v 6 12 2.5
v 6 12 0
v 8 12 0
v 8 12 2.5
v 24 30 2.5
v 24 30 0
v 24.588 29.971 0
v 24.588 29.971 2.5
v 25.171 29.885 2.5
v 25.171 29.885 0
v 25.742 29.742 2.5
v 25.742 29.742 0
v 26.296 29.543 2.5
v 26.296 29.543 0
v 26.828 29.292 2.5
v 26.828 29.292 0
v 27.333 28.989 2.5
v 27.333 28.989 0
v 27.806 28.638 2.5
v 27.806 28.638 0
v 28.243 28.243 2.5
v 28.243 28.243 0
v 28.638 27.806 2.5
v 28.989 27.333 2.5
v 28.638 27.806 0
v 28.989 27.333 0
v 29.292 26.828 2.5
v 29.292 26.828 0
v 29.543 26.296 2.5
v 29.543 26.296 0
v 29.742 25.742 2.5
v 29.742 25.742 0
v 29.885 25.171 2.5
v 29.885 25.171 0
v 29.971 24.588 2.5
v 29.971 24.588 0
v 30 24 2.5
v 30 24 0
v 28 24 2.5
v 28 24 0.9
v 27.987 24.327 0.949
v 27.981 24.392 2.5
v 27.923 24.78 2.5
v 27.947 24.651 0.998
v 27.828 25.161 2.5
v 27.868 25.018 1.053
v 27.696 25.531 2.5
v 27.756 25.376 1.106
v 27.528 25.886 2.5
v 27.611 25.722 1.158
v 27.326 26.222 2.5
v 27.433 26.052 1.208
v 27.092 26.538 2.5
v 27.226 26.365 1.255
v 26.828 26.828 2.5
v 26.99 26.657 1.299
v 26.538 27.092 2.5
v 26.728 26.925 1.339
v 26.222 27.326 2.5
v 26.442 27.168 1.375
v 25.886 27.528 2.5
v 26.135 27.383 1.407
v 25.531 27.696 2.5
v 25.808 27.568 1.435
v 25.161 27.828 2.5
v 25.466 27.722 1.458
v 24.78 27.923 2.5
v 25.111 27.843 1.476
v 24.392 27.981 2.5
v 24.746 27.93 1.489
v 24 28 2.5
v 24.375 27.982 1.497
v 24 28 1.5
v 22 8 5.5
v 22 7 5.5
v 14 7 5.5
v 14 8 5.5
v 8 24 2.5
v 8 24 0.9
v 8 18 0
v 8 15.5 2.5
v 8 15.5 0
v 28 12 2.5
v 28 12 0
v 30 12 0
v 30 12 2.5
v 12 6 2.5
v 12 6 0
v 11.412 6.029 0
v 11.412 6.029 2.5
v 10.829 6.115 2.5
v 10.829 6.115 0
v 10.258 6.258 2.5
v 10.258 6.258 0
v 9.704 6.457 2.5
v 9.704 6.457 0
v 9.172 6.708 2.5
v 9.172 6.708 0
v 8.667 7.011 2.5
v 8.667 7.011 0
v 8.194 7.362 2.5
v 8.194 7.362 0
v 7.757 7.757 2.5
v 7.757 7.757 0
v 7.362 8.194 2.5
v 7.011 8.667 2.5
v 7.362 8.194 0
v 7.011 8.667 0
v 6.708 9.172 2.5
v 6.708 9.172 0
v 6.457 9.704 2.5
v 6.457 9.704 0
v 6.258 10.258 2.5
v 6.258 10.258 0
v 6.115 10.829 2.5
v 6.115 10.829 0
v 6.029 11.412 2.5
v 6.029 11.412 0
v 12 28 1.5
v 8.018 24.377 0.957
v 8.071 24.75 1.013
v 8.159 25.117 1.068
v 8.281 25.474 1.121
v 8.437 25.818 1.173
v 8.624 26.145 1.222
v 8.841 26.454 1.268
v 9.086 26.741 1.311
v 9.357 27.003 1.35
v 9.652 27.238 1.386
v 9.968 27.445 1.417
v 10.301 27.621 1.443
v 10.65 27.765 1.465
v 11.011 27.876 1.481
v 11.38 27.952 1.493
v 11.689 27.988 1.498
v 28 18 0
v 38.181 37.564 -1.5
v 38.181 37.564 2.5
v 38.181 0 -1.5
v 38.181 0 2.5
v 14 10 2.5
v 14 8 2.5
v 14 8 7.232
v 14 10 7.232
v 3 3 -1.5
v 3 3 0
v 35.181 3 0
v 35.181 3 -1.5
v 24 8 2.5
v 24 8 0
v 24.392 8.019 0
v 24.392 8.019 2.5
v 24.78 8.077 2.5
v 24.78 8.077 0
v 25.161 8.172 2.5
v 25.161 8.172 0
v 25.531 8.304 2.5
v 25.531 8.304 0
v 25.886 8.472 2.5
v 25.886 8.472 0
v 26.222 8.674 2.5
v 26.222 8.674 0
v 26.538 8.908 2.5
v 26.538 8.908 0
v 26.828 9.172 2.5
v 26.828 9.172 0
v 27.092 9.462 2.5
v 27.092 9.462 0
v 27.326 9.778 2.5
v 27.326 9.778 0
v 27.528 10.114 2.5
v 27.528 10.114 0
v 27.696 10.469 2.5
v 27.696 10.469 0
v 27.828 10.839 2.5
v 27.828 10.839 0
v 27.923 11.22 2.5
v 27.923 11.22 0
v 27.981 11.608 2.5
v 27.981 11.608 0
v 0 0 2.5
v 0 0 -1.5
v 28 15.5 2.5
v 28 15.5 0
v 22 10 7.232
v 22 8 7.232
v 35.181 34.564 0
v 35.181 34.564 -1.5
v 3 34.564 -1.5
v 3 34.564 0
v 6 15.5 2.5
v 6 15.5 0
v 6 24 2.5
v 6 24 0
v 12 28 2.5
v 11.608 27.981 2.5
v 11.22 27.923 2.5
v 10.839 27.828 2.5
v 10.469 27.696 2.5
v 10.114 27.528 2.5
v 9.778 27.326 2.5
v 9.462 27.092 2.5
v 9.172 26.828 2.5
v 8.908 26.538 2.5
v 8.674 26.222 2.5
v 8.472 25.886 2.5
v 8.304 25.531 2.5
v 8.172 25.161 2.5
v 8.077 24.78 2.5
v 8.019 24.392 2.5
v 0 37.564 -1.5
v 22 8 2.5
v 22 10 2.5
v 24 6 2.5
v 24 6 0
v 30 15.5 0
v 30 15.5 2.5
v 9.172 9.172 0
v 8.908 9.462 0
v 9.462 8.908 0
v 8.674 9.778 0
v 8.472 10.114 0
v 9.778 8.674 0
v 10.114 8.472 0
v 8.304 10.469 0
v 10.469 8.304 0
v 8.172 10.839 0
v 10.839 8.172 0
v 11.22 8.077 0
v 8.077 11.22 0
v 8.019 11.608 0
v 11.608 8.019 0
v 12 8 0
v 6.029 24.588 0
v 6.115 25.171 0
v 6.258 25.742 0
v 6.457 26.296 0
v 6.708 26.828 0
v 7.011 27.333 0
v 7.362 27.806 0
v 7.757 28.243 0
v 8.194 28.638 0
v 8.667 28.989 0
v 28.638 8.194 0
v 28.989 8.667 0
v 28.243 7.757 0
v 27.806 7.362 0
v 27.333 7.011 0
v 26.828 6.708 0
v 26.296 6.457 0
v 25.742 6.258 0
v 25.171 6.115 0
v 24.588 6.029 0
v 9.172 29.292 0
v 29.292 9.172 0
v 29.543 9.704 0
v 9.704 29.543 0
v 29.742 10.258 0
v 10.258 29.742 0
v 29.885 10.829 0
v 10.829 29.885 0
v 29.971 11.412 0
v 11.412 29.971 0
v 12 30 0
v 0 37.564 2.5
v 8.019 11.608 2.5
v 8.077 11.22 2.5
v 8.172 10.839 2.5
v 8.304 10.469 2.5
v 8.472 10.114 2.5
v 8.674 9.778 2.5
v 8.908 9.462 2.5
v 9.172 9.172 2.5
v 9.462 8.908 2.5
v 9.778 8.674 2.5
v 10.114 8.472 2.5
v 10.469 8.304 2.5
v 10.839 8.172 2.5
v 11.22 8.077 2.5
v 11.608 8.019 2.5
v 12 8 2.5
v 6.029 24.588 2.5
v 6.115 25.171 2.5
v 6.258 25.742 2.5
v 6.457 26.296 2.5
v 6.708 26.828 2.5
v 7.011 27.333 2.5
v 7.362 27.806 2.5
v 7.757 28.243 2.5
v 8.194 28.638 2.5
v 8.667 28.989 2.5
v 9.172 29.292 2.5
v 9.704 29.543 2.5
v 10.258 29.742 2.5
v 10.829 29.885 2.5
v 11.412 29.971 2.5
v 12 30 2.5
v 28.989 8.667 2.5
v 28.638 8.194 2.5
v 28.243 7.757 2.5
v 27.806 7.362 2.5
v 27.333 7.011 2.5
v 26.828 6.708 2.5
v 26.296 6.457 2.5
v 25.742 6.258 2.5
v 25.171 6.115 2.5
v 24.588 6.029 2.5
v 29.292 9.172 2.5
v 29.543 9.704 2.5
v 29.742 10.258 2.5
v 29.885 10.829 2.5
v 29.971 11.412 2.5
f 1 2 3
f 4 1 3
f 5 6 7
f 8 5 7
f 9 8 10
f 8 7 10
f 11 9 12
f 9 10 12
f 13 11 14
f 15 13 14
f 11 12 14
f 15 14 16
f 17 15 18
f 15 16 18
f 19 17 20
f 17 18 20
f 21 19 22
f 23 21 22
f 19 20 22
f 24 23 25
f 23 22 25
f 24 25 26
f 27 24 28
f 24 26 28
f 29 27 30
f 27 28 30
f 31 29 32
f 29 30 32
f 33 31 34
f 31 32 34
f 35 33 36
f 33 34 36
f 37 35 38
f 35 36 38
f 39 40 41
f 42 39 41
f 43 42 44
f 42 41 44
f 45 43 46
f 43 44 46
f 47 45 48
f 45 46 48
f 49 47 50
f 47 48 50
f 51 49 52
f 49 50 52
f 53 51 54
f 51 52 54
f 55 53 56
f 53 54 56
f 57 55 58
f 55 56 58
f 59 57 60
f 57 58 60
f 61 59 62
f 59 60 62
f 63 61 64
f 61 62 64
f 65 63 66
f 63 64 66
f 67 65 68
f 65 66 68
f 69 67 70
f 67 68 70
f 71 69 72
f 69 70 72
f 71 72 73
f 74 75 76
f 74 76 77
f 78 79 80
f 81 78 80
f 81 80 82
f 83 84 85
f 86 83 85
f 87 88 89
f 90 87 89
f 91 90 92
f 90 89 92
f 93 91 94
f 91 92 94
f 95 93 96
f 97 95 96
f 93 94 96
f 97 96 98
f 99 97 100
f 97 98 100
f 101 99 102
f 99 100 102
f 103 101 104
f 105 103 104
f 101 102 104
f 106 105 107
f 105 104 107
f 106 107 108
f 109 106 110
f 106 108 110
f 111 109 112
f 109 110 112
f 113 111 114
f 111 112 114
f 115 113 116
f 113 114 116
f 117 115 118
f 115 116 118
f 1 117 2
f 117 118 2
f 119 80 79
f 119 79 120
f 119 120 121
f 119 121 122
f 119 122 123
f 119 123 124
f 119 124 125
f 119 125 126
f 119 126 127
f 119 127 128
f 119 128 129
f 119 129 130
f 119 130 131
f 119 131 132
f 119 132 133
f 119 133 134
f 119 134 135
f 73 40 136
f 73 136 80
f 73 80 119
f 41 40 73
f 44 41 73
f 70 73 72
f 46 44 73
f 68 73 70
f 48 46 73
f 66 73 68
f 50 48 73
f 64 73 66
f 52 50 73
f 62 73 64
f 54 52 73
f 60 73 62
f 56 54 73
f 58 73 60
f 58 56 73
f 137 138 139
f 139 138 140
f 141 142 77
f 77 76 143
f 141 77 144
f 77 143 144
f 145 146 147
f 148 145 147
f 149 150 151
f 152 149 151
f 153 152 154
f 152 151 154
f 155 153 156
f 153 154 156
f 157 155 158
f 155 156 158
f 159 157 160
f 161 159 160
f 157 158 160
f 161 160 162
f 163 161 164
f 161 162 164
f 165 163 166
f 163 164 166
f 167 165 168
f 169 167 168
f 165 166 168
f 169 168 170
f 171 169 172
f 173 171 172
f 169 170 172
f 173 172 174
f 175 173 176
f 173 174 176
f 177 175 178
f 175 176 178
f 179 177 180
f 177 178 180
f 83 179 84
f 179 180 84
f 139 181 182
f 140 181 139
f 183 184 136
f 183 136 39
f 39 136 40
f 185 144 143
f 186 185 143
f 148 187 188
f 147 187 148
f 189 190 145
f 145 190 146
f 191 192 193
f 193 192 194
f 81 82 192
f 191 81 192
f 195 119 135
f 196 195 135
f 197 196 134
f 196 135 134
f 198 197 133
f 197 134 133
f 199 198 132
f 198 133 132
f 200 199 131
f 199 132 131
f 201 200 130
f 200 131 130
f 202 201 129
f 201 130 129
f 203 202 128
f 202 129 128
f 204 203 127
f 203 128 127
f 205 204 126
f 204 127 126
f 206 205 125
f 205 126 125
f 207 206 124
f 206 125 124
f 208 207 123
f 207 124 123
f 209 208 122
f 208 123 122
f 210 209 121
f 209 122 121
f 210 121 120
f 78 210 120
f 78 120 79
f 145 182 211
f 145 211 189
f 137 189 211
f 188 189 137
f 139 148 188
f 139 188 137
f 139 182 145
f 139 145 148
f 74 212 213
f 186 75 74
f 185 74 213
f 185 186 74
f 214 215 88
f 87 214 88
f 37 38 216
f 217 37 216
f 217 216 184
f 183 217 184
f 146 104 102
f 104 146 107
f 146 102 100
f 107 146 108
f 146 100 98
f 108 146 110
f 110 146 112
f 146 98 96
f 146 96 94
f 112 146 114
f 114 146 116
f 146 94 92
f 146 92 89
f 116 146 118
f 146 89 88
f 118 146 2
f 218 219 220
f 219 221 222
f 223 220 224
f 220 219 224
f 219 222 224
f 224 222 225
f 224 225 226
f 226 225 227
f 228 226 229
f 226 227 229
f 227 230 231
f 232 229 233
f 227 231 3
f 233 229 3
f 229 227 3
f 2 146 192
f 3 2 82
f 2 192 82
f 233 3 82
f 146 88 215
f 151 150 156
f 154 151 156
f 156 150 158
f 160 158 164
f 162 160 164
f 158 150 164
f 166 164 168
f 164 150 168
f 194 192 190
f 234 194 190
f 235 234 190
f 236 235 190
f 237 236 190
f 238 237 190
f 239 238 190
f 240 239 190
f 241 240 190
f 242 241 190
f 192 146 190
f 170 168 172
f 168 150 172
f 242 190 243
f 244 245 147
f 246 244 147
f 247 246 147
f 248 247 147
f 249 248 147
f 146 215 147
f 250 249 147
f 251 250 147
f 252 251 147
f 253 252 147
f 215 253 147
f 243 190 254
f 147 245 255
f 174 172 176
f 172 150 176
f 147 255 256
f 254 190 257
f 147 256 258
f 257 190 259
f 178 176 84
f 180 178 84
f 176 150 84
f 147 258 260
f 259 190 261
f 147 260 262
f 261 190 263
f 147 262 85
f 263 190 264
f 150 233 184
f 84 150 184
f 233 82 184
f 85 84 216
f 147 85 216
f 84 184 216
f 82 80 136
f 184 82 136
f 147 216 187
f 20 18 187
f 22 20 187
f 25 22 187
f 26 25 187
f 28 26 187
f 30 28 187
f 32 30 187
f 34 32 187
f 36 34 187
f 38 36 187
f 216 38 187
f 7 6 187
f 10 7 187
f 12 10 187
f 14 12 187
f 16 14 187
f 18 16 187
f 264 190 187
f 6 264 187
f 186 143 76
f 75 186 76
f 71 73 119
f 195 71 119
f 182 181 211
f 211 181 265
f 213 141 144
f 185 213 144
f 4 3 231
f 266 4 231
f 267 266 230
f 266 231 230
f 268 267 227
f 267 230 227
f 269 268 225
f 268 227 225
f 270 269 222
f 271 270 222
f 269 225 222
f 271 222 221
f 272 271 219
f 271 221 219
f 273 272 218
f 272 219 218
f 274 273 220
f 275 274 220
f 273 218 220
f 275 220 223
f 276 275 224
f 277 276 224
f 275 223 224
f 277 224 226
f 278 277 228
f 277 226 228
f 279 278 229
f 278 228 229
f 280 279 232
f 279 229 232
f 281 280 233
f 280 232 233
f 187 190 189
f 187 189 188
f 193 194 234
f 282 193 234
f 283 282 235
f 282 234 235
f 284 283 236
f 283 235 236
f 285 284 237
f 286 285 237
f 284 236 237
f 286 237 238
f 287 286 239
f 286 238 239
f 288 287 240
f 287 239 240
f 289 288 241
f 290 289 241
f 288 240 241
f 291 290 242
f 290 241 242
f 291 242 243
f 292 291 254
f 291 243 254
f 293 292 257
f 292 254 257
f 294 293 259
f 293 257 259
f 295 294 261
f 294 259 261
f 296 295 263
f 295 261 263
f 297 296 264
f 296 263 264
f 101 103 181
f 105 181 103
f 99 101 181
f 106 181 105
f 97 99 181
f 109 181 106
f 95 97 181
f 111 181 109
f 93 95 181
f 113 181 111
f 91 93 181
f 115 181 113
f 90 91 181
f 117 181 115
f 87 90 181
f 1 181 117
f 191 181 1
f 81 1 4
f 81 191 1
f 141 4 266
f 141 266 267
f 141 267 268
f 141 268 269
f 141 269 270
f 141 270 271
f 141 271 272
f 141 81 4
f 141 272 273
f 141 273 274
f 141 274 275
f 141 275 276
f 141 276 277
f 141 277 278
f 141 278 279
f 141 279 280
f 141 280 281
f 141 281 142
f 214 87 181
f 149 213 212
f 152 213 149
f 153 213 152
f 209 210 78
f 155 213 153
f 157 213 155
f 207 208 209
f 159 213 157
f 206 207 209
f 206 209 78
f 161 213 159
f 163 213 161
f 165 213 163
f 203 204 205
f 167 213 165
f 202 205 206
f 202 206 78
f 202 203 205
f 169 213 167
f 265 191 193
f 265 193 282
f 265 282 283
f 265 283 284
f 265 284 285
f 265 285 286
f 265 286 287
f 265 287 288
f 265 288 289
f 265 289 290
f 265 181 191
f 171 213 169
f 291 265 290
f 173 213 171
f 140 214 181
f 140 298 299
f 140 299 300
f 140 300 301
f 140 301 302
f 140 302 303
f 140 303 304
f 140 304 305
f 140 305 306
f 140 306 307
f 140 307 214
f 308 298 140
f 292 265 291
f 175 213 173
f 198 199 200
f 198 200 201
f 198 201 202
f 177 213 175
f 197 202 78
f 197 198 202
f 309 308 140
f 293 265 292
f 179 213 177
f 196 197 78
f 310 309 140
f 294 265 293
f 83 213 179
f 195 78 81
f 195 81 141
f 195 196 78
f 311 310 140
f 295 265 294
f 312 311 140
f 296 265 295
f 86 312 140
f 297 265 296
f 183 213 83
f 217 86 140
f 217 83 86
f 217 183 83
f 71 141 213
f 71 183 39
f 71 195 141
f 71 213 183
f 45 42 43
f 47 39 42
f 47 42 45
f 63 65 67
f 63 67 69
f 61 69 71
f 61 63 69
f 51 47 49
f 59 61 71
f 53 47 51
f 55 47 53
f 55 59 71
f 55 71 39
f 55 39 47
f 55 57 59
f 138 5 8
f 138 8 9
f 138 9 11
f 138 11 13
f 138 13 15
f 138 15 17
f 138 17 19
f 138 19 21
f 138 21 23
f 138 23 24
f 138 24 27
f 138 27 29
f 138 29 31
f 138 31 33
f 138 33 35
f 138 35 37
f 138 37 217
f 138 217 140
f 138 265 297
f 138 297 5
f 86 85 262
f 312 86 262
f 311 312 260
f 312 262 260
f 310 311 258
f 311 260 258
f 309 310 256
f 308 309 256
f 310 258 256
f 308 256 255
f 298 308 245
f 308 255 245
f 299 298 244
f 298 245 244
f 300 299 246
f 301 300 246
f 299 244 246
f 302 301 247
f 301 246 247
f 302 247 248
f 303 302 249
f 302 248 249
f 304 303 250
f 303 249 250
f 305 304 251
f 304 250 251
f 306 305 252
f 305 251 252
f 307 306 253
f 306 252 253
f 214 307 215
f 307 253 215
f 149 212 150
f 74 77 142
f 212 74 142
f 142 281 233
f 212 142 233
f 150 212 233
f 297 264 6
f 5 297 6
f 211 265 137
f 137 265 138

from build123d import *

# Parameters (mm, degrees)
F0_W        = 38.181103766
F0_H        = 37.5636257231
F1_DEPTH    = 2.5
F2_W        = 38.181103766
F2_H        = 37.5636257231
F2_W_2      = 32.181103766
F2_H_2      = 31.5636257231
F3_DEPTH    = 1.5
F5_DEPTH    = 22
F6_DEPTH    = 14
F7_T4_DEPTH = 63.9787194011


# Not quite as in the source:
# - a fillet or chamfer that OpenCascade refuses, or shapes differently, is made with other operations: its cross-section is extruded or revolved along the edge and cut away or added


with BuildPart() as f1:
    # F0 (on Top) → F1 (new body)
    with BuildSketch(Plane.XY):
        with Locations((19.090551883, 18.7818128616)):
            Rectangle(F0_W, F0_H)
        with BuildLine():
            ThreePointArc((8, 12), (9.1715728753, 9.1715728753), (12, 8))
            Line((12, 8), (24, 8))
            ThreePointArc((24, 8), (26.8284271247, 9.1715728753), (28, 12))
            Line((28, 12), (30, 12))
            ThreePointArc((30, 12), (28.2426406871, 7.7573593129), (24, 6))
            Line((24, 6), (12, 6))
            ThreePointArc((12, 6), (7.7573593129, 7.7573593129), (6, 12))
            Line((6, 12), (8, 12))
        make_face(mode=Mode.SUBTRACT)
        with BuildLine():
            Line((24, 28), (12, 28))
            ThreePointArc((12, 28), (9.1715728753, 26.8284271247), (8, 24))
            Line((8, 24), (8, 15.5))
            Line((8, 15.5), (6, 15.5))
            Line((6, 15.5), (6, 24))
            ThreePointArc((6, 24), (7.7573593129, 28.2426406871), (12, 30))
            Line((12, 30), (24, 30))
            ThreePointArc((24, 30), (28.2426406871, 28.2426406871), (30, 24))
            Line((30, 24), (30, 15.5))
            Line((30, 15.5), (28, 15.5))
            Line((28, 15.5), (28, 24))
            ThreePointArc((28, 24), (26.8284271247, 26.8284271247), (24, 28))
        make_face(mode=Mode.SUBTRACT)
    extrude(amount=F1_DEPTH)

    # F2 (on face) → F3 (join)
    with BuildSketch(Plane(origin=(0, 0, 0), x_dir=(1, 0, 0), z_dir=(0, 0, -1))):
        with Locations((19.090551883, -18.7818128616)):
            Rectangle(F2_W, F2_H)
        with Locations((19.090551883, -18.7818128616)):
            Rectangle(F2_W_2, F2_H_2, mode=Mode.SUBTRACT)
    extrude(amount=F3_DEPTH)

    # F4 (on Right) → F5 (join)
    with BuildSketch(Plane.YZ):
        Polygon((8, 5.5), (8, 2.5), (10, 2.5), (10, 7.2320508076), (8, 7.2320508076), (7, 5.5), align=None)
    extrude(amount=F5_DEPTH)

    # F4 (on Right) → F6 (cut)
    with BuildSketch(Plane.YZ):
        Polygon((8, 5.5), (8, 2.5), (10, 2.5), (10, 7.2320508076), (8, 7.2320508076), (7, 5.5), align=None)
    extrude(amount=F6_DEPTH, mode=Mode.SUBTRACT)

    # F7: chamfer of 10 x 1.5 on 1 edges, made by hand


with BuildPart() as f7_tool2:
    # F7_s3 → F7_t4 (new body)
    with BuildSketch(Plane.YZ.offset(49.9893597005)):
        Polygon((18, 0), (28, 1.5), (28, 0), align=None)
    extrude(amount=-F7_T4_DEPTH)

    split(bisect_by=Plane.YZ.offset(8), keep=Keep.TOP)

    split(bisect_by=Plane.YZ.offset(28), keep=Keep.BOTTOM)


with BuildPart() as f1_1:
    add(f1.part)

    # F7_t1: cut F7_tool2
    add(f7_tool2.part, mode=Mode.SUBTRACT)


solid = f1_1.part
